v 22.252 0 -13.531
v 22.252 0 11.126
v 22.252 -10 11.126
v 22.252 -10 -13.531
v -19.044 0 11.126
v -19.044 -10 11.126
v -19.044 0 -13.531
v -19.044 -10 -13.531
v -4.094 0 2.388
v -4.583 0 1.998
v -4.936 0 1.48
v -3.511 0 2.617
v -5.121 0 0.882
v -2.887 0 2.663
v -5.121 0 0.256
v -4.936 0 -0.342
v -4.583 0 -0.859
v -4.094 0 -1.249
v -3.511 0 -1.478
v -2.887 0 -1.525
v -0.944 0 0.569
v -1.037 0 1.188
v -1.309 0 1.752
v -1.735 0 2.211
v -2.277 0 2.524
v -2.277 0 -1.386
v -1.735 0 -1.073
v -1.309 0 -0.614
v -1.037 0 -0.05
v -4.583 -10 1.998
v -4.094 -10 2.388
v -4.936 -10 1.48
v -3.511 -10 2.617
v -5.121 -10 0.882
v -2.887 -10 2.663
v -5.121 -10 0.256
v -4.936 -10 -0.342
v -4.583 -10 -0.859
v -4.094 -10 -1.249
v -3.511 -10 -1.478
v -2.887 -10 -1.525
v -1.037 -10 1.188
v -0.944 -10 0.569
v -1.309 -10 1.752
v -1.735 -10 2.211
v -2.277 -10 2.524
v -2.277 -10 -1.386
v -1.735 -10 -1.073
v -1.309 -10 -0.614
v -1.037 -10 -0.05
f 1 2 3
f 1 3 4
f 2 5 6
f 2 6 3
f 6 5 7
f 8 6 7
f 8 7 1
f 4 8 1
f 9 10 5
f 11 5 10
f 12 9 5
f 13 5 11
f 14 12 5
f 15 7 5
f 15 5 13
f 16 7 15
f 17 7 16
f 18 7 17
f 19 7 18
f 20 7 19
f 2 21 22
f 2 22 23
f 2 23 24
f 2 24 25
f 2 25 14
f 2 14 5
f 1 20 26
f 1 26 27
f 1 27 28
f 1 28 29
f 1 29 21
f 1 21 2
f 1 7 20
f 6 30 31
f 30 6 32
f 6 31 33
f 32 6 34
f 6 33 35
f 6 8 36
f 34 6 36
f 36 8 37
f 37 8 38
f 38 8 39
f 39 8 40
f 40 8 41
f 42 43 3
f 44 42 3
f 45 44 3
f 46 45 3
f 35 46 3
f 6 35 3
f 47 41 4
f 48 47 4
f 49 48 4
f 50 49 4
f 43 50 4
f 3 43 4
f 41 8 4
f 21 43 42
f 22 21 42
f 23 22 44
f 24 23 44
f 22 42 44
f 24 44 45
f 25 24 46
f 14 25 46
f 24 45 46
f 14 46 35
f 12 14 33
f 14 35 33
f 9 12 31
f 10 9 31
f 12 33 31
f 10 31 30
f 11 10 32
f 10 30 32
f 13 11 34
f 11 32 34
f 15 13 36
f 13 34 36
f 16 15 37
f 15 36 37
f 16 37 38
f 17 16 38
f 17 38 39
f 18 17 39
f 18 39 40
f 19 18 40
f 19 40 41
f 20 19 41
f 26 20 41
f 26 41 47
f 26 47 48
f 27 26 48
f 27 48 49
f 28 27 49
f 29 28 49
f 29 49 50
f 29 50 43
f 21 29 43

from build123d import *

# Parameters (mm, degrees)
SKETCH1_W                 = 41.295636026
SKETCH1_H                 = 24.657103064
BOSS_EXTRUDE1_DEPTH       = 10
M5X0_8_TAPPED_HOLE1_D     = 4.2
M5X0_8_TAPPED_HOLE1_DEPTH = 14
M5X0_8_TAPPED_HOLE1_TIP   = 1.2618073


with BuildPart() as part:
    # Sketch1 → Boss-Extrude1 (new body)
    with BuildSketch(Plane(origin=(0, 0, 0), x_dir=(1, 0, 0), z_dir=(0, 1, 0))):
        with Locations((1.60371402, 1.202785515)):
            Rectangle(SKETCH1_W, SKETCH1_H)
    extrude(amount=-BOSS_EXTRUDE1_DEPTH)

    # M5x0.8 Tapped Hole1
    with Locations(Plane(origin=(0, 0, 0), x_dir=(-1, 0, 0), z_dir=(0, 1, 0))):
        with Locations((3.044035574, 0.569159987)):
            Hole(M5X0_8_TAPPED_HOLE1_D / 2, depth=M5X0_8_TAPPED_HOLE1_DEPTH)
            with Locations((0, 0, -(M5X0_8_TAPPED_HOLE1_DEPTH + M5X0_8_TAPPED_HOLE1_TIP / 2))):  # 118° drill point
                Cone(0, M5X0_8_TAPPED_HOLE1_D / 2, M5X0_8_TAPPED_HOLE1_TIP, mode=Mode.SUBTRACT)


solid = part.part
